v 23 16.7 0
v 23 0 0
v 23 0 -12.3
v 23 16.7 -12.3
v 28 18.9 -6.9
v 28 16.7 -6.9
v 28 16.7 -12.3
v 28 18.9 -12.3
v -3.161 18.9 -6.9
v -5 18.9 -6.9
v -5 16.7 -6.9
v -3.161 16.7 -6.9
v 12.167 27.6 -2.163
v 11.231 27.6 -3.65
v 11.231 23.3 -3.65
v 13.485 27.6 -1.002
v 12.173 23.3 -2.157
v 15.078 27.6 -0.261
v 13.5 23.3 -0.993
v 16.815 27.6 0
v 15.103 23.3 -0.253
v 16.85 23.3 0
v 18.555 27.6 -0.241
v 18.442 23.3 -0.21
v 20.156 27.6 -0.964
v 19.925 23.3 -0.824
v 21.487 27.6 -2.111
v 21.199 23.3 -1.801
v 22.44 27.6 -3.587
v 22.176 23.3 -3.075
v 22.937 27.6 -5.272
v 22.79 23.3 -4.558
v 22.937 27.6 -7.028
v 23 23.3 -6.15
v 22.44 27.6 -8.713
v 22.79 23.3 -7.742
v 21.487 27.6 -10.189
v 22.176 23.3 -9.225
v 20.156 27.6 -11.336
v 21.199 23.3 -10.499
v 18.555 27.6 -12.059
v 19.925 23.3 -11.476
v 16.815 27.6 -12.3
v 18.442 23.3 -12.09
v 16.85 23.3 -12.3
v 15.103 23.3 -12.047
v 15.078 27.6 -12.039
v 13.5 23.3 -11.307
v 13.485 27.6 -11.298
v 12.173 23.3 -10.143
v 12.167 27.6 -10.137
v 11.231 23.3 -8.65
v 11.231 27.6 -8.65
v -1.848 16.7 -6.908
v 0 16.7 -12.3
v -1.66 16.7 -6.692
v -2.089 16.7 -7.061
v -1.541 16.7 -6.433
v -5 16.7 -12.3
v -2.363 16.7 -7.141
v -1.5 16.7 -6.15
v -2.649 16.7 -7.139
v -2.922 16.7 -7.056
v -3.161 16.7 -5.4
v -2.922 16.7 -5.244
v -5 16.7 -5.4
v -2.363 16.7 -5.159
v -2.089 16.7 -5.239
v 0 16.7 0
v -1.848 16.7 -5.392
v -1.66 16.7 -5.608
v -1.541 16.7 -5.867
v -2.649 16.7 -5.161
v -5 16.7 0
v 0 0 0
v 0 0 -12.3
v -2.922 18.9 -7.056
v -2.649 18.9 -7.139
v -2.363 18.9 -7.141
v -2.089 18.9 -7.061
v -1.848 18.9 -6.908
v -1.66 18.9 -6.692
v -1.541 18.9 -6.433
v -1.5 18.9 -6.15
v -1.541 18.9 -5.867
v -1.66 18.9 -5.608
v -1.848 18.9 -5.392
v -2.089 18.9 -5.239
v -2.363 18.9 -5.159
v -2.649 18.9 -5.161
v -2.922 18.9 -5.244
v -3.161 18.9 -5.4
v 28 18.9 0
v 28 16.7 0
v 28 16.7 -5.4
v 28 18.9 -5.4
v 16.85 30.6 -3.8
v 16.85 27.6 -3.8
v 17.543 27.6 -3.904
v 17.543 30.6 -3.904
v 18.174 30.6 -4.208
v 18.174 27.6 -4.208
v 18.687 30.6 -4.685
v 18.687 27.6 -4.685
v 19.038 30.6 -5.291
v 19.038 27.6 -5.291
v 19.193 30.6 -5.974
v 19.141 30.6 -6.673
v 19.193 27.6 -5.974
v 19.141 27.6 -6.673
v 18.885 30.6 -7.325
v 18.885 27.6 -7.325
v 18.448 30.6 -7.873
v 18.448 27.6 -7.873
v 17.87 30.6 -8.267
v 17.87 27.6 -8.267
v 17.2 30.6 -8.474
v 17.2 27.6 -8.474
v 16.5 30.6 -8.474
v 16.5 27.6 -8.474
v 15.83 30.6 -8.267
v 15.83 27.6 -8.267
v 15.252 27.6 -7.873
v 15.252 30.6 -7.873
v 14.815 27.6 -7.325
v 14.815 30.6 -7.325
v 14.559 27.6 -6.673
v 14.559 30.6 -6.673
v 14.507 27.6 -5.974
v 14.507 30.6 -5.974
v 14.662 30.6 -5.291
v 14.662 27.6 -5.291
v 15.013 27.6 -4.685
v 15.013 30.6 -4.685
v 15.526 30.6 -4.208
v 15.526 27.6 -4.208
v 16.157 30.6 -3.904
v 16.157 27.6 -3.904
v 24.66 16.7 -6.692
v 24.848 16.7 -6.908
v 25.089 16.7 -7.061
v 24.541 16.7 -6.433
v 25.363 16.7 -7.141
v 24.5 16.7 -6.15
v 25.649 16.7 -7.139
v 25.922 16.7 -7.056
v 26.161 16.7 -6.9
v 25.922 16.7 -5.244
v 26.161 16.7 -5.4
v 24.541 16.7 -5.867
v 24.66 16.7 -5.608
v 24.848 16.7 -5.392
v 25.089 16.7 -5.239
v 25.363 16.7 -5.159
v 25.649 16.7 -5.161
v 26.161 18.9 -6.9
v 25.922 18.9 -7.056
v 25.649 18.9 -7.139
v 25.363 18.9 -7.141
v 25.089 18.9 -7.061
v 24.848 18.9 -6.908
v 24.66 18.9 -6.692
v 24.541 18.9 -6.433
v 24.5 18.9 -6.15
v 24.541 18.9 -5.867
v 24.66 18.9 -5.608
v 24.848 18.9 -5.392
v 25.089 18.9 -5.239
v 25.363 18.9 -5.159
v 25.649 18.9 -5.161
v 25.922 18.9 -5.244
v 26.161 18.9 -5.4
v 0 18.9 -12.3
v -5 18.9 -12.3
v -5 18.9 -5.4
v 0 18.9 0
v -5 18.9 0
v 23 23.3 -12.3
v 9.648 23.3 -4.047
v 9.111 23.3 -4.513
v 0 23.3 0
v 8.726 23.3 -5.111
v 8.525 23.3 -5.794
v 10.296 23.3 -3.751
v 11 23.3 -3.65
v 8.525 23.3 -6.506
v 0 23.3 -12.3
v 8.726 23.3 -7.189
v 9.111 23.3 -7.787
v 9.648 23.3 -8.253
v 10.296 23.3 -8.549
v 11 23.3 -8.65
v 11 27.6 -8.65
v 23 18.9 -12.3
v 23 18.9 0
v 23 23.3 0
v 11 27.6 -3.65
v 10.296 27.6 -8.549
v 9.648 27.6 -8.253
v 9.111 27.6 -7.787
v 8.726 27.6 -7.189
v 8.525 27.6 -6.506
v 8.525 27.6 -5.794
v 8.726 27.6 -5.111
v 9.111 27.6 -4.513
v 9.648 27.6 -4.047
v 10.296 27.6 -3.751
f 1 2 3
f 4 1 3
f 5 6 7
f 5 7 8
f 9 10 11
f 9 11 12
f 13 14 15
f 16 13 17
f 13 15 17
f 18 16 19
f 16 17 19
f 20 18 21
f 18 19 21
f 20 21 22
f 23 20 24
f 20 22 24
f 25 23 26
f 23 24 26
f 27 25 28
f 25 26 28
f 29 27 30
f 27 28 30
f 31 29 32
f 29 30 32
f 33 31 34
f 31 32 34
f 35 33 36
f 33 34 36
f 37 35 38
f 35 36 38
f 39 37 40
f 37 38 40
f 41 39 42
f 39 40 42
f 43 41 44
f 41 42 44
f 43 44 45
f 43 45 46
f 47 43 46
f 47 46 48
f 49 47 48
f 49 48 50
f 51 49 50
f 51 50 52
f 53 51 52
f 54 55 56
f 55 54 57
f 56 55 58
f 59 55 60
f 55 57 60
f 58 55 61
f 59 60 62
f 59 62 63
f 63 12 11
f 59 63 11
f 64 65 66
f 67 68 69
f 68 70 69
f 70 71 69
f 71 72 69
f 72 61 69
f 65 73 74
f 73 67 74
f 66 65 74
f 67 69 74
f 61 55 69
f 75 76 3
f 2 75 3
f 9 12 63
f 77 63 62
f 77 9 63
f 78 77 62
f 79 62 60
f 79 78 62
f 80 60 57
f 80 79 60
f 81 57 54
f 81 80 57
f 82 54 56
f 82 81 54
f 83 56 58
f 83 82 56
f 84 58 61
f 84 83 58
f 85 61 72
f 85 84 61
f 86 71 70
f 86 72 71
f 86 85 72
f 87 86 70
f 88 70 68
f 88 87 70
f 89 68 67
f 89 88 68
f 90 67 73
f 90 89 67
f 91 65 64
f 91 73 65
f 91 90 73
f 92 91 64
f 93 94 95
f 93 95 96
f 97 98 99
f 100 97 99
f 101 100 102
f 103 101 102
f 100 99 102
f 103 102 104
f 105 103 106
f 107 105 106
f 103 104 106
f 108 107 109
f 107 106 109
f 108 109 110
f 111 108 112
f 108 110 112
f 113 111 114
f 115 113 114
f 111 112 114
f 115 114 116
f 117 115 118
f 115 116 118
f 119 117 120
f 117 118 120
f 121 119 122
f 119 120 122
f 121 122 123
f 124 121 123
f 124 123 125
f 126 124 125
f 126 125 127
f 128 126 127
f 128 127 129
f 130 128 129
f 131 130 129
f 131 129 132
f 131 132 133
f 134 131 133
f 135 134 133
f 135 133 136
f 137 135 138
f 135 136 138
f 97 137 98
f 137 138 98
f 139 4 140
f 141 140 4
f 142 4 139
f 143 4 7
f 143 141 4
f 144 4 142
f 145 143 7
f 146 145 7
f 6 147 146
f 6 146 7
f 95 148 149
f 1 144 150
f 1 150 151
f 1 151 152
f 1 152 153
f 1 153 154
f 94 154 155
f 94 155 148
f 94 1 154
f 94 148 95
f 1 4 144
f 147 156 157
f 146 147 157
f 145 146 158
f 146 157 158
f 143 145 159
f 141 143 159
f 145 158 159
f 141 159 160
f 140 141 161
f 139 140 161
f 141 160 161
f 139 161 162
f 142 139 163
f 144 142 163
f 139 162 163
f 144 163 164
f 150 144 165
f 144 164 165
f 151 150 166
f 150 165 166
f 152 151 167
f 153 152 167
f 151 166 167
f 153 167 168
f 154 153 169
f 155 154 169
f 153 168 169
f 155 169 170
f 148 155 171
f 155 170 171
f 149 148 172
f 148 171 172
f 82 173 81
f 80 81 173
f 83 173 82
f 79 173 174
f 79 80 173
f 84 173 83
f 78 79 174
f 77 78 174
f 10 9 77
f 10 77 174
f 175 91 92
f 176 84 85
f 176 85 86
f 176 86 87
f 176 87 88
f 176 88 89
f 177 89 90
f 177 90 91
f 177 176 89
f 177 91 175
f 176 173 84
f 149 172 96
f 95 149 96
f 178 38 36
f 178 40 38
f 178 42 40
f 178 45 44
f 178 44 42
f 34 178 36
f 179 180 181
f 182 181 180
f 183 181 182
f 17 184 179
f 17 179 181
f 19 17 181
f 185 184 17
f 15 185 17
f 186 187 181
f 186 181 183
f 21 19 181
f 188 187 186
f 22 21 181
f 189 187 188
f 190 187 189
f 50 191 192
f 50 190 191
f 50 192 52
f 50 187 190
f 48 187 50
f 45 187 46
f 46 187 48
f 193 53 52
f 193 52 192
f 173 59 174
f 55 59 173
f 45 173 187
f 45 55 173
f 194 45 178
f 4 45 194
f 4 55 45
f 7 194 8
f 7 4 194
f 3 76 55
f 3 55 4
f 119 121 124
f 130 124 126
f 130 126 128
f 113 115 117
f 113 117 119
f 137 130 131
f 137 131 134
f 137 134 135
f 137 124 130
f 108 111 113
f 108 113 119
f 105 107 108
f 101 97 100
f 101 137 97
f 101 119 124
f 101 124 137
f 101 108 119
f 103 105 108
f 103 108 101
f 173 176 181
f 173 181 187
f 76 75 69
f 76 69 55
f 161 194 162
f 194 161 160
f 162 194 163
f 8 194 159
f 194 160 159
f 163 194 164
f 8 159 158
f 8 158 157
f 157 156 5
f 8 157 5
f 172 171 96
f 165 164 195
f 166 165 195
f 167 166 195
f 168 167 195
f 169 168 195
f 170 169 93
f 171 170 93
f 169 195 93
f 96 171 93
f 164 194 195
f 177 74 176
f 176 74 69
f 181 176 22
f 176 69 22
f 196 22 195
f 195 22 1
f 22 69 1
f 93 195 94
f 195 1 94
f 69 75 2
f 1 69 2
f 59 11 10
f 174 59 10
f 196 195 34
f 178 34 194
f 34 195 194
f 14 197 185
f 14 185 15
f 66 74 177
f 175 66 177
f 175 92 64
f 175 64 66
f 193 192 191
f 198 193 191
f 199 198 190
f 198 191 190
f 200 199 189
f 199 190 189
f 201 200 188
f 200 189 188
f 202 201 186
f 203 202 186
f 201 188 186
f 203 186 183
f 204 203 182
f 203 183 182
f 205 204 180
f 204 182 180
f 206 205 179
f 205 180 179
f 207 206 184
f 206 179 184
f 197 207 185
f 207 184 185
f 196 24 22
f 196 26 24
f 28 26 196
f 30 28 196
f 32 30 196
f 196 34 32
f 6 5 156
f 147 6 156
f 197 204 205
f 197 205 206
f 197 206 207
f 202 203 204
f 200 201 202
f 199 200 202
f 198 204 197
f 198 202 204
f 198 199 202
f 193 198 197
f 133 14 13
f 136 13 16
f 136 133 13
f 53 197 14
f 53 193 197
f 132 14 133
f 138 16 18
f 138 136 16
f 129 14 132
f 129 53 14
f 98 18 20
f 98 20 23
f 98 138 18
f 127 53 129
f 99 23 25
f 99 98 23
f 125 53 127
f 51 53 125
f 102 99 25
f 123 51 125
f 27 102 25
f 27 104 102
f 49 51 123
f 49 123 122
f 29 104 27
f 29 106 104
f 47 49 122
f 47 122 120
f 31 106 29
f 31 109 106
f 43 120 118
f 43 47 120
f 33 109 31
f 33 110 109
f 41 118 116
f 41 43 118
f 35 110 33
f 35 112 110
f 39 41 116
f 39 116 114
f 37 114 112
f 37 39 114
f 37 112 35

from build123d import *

# Parameters (mm, degrees)
SKETCH_1_W          = 23
SKETCH_1_H          = 12.3
EXTRUDE_1_DEPTH     = 23.3
SKETCH_3_W          = 5
SKETCH_3_H          = 2.2
EXTRUDE_2_DEPTH     = 12.3
CUT_EXTRUDE_1_DEPTH = 36.951356024
EXTRUDE_3_DEPTH     = 4.3
SKETCH_6_R          = 2.35
EXTRUDE_4_DEPTH     = 3


with BuildPart() as part:
    # Эскиз1 → Бобышка-Вытянуть1 (new body)
    with BuildSketch(Plane(origin=(0, 0, 0), x_dir=(1, 0, 0), z_dir=(0, 1, 0))):
        with Locations((11.5, 6.15)):
            Rectangle(SKETCH_1_W, SKETCH_1_H)
    extrude(amount=EXTRUDE_1_DEPTH)

    # Эскиз3 → Бобышка-Вытянуть2 (add)
    with BuildSketch(Plane.XY):
        with Locations((25.5, 17.8)):
            Rectangle(SKETCH_3_W, SKETCH_3_H)
    extrude_2 = extrude(amount=-EXTRUDE_2_DEPTH)

    # Эскиз4 → Вырез-Вытянуть1 (cut, through all)
    with BuildSketch(Plane(origin=(0, 18.9, 0), x_dir=(1, 0, 0), z_dir=(0, 1, 0))):
        with BuildLine():
            Line((28, 6.15), (28, 6.9))
            Line((28, 6.9), (26.161437828, 6.9))
            ThreePointArc((26.161437828, 6.9), (24.5, 6.15), (26.161437828, 5.4))
            Line((26.161437828, 5.4), (28, 5.4))
            Line((28, 5.4), (28, 6.15))
        make_face()
    cut_extrude_1 = extrude(amount=-CUT_EXTRUDE_1_DEPTH, mode=Mode.SUBTRACT)

    # Зеркальное отражение2: Бобышка-Вытянуть2, Вырез-Вытянуть1 across plane
    add(extrude_2.mirror(Plane.ZY.offset(-11.5)))
    add(cut_extrude_1.mirror(Plane.ZY.offset(-11.5)), mode=Mode.SUBTRACT)

    # Эскиз5 → Бобышка-Вытянуть3 (add)
    with BuildSketch(Plane(origin=(0, 23.3, 0), x_dir=(1, 0, 0), z_dir=(0, 1, 0))):
        with BuildLine():
            Line((11, 3.65), (11.231058819, 3.65))
            ThreePointArc((11.231058819, 3.65), (23, 6.15), (11.231058819, 8.65))
            Line((11.231058819, 8.65), (11, 8.65))
            ThreePointArc((11, 8.65), (8.5, 6.15), (11, 3.65))
        make_face()
    extrude(amount=EXTRUDE_3_DEPTH)

    # Эскиз6 → Бобышка-Вытянуть4 (add)
    with BuildSketch(Plane(origin=(0, 27.6, 0), x_dir=(1, 0, 0), z_dir=(0, 1, 0))):
        with Locations(Location((16.85, 6.15, 0), (0, 0, 270))):
            Circle(SKETCH_6_R)
    extrude(amount=EXTRUDE_4_DEPTH)


solid = part.part
